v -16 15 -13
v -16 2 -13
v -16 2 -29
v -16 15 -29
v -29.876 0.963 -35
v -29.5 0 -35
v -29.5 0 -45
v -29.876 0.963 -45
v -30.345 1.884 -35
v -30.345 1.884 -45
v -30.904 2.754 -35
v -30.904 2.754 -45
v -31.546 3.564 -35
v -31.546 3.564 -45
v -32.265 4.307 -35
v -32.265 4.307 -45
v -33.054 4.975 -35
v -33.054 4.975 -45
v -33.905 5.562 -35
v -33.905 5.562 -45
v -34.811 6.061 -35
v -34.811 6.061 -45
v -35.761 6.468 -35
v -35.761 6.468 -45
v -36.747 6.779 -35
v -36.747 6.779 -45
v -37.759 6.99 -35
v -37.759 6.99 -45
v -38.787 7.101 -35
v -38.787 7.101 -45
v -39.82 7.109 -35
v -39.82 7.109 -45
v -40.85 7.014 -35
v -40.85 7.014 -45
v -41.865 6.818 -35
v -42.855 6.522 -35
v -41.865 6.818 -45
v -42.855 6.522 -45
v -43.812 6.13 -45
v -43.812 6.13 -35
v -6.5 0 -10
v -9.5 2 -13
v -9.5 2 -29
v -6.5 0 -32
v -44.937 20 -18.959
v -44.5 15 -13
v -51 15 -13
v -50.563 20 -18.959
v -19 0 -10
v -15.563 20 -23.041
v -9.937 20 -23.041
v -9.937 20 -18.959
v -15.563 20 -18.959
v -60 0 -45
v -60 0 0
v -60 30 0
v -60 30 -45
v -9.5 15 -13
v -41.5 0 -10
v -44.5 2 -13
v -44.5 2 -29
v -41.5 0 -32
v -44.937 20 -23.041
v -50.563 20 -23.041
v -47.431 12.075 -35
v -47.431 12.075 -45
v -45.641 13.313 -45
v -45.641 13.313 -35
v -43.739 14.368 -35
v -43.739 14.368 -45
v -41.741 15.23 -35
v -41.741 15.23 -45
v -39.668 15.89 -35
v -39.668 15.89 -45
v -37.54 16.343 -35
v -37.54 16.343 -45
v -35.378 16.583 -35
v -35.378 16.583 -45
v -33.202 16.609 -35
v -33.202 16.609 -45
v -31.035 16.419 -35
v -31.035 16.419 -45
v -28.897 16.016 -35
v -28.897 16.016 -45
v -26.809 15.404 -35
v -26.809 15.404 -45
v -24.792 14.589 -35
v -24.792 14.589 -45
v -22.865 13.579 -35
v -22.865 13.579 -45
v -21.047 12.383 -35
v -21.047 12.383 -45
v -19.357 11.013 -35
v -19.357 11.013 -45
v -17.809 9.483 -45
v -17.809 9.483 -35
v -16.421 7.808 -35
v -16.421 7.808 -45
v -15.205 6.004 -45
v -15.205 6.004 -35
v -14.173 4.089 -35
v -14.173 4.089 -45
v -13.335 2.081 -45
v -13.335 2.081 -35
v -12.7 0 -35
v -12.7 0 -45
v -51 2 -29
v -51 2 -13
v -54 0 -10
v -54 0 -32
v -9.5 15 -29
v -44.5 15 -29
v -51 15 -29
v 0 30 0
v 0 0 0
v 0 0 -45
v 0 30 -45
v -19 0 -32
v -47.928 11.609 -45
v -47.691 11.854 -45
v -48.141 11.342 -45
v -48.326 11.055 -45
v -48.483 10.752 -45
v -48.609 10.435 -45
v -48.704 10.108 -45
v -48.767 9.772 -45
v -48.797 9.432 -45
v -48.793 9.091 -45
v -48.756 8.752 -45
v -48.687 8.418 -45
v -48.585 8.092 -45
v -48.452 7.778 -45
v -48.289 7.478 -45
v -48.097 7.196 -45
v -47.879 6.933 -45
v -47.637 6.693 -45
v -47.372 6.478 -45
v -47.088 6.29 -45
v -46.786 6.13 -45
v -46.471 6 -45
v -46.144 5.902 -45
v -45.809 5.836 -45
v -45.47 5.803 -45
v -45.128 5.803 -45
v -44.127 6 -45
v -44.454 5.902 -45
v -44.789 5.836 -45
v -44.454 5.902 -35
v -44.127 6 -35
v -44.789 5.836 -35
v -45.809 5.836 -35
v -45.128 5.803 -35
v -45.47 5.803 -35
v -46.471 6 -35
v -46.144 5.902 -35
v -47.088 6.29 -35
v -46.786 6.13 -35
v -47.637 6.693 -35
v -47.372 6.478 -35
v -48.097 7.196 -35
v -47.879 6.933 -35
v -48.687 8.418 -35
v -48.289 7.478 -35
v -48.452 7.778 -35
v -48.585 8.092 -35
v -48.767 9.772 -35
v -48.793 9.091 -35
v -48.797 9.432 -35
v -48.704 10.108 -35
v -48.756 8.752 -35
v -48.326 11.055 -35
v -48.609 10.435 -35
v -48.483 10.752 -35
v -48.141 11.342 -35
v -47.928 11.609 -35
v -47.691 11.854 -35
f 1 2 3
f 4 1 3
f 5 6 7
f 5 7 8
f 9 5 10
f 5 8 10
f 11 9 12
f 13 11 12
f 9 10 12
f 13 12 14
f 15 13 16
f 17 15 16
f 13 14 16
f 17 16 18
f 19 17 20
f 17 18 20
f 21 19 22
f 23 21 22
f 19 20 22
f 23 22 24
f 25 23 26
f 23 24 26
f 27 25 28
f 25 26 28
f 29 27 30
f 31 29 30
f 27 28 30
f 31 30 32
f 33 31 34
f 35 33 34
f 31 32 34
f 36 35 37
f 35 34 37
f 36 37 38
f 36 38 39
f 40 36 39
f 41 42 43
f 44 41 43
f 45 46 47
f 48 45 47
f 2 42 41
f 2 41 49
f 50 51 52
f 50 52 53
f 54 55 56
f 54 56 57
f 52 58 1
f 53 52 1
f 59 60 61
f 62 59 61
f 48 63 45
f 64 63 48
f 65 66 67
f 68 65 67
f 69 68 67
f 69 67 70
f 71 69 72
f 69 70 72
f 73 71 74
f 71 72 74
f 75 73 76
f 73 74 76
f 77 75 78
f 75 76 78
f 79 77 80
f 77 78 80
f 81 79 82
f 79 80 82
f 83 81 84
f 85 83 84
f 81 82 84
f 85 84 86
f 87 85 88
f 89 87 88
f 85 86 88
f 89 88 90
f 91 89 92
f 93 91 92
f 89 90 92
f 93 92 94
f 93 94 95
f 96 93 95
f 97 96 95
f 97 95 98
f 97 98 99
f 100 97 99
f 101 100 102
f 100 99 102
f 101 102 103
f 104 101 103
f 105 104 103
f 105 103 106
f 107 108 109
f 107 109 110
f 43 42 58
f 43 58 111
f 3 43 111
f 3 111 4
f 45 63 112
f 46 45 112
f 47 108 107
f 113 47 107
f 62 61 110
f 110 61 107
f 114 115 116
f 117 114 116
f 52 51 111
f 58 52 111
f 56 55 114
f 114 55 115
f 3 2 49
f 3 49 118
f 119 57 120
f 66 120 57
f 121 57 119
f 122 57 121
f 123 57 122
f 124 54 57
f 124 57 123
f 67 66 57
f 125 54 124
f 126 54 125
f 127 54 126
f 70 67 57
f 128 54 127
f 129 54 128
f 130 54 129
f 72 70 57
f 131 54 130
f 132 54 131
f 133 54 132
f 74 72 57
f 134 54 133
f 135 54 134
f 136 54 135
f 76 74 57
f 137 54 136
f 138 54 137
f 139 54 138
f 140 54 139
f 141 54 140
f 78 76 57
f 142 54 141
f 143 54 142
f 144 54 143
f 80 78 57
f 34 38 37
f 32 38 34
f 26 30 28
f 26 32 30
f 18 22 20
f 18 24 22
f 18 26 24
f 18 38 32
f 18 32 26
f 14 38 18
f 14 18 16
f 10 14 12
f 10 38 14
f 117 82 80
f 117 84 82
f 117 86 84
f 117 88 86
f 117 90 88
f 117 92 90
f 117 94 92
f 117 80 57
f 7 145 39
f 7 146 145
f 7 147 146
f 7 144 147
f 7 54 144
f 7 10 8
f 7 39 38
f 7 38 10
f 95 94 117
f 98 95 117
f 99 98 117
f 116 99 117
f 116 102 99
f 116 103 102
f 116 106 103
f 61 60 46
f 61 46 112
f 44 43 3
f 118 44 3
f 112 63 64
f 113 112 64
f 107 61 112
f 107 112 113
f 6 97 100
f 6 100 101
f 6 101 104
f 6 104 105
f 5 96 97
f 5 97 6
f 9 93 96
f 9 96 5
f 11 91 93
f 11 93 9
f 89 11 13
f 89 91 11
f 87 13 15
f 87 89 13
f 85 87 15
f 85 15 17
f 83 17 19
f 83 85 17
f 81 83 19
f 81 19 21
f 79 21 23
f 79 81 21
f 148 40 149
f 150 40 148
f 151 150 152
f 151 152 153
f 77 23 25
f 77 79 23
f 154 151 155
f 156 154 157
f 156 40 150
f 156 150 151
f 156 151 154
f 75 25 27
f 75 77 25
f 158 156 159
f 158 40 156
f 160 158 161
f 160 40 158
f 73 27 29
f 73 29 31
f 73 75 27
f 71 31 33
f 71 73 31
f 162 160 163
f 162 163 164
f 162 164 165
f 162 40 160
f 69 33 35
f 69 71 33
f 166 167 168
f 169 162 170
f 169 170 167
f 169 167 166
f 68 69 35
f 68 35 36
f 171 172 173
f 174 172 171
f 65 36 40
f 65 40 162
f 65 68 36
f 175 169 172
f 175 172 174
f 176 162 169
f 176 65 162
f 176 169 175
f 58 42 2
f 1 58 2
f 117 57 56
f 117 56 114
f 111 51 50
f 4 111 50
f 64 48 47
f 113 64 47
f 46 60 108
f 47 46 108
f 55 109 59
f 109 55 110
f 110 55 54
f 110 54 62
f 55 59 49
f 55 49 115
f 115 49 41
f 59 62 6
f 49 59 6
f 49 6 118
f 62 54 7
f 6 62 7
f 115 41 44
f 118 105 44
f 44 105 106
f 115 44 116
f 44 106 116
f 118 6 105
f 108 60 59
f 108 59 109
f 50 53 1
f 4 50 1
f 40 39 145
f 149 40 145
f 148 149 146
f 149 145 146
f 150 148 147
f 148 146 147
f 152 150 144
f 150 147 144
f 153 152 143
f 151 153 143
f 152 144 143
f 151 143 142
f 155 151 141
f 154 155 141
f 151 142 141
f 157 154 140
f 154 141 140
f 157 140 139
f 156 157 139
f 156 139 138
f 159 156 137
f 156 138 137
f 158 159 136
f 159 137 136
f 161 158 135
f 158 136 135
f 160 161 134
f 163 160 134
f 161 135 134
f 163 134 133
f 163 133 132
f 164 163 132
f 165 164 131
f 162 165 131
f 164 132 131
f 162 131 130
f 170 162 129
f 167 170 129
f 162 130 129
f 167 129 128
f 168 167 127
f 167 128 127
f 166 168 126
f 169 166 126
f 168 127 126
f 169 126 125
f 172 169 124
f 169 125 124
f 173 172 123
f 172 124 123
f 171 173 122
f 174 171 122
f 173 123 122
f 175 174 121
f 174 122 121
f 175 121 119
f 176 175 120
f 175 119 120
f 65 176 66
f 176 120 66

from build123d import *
from OCP.BRepFilletAPI import BRepFilletAPI_MakeChamfer

# Parameters (mm, degrees)
SKETCH1_W           = 60
SKETCH1_H           = 45
BOSS_EXTRUDE1_DEPTH = 30
SKETCH2_W           = 6.5
SKETCH2_H           = 16
CUT_EXTRUDE1_DEPTH  = 20
CHAMFER1_SIZE       = 5
CHAMFER1_SIZE2      = 0.437443318
CHAMFER2_SIZE       = 5
CHAMFER2_SIZE2      = 5.958767963
CUT_EXTRUDE2_DEPTH  = 10
CHAMFER3_SIZE       = 3
CHAMFER3_SIZE2      = 2


with BuildPart() as part:
    # Sketch1 → Boss-Extrude1 (new body)
    with BuildSketch(Plane(origin=(0, 0, 0), x_dir=(1, 0, 0), z_dir=(0, 1, 0))):
        with Locations((-30, 22.5)):
            Rectangle(SKETCH1_W, SKETCH1_H)
    extrude(amount=BOSS_EXTRUDE1_DEPTH)

    # Sketch2 → Cut-Extrude1 (cut)
    with BuildSketch(Plane(origin=(0, 0, 0), x_dir=(-1, 0, 0), z_dir=(0, -1, 0))):
        with Locations((47.75, 21)):
            Rectangle(SKETCH2_W, SKETCH2_H)
        with Locations((12.75, 21)):
            Rectangle(SKETCH2_W, SKETCH2_H)
    extrude(amount=-CUT_EXTRUDE1_DEPTH, mode=Mode.SUBTRACT)

    # Chamfer1: one chamfer whose edges measure the first distance from different faces: ONE call of the kernel's chamfer builder (chamfer() names one face for all edges)
    chamfer1_edges_1 = [part.edges().sort_by_distance(p)[0] for p in [
        (-51, 20, -21),
    ]]
    chamfer1_side_1 = [part.faces().sort_by_distance(p)[0] for p in [
        (-51, 10, -21),
    ]]
    chamfer1_edges_2 = [part.edges().sort_by_distance(p)[0] for p in [
        (-44.5, 20, -21),
    ]]
    chamfer1_side_2 = [part.faces().sort_by_distance(p)[0] for p in [
        (-44.5, 10, -21),
    ]]
    chamfer1_edges_3 = [part.edges().sort_by_distance(p)[0] for p in [
        (-16, 20, -21),
    ]]
    chamfer1_side_3 = [part.faces().sort_by_distance(p)[0] for p in [
        (-16, 10, -21),
    ]]
    chamfer1_edges_4 = [part.edges().sort_by_distance(p)[0] for p in [
        (-9.5, 20, -21),
    ]]
    chamfer1_side_4 = [part.faces().sort_by_distance(p)[0] for p in [
        (-9.5, 10, -21),
    ]]
    chamfer1 = BRepFilletAPI_MakeChamfer(part.part.solid().wrapped)
    for e in chamfer1_edges_1:
        chamfer1.Add(CHAMFER1_SIZE, CHAMFER1_SIZE2, e.wrapped, chamfer1_side_1[0].wrapped)  # the first distance lies on this face
    for e in chamfer1_edges_2:
        chamfer1.Add(CHAMFER1_SIZE, CHAMFER1_SIZE2, e.wrapped, chamfer1_side_2[0].wrapped)  # the first distance lies on this face
    for e in chamfer1_edges_3:
        chamfer1.Add(CHAMFER1_SIZE, CHAMFER1_SIZE2, e.wrapped, chamfer1_side_3[0].wrapped)  # the first distance lies on this face
    for e in chamfer1_edges_4:
        chamfer1.Add(CHAMFER1_SIZE, CHAMFER1_SIZE2, e.wrapped, chamfer1_side_4[0].wrapped)  # the first distance lies on this face
    add(Compound.cast(chamfer1.Shape()), mode=Mode.REPLACE)

    # Chamfer2: one chamfer whose edges measure the first distance from different faces: ONE call of the kernel's chamfer builder (chamfer() names one face for all edges)
    chamfer2_edges_1 = [part.edges().sort_by_distance(p)[0] for p in [
        (-47.75, 20, -29),
    ]]
    chamfer2_side_1 = [part.faces().sort_by_distance(p)[0] for p in [
        (-47.75, 9.857394508, -29),
    ]]
    chamfer2_edges_2 = [part.edges().sort_by_distance(p)[0] for p in [
        (-12.75, 20, -29),
    ]]
    chamfer2_side_2 = [part.faces().sort_by_distance(p)[0] for p in [
        (-12.75, 9.857394508, -29),
    ]]
    chamfer2_edges_3 = [part.edges().sort_by_distance(p)[0] for p in [
        (-12.75, 20, -13),
    ]]
    chamfer2_side_3 = [part.faces().sort_by_distance(p)[0] for p in [
        (-12.75, 9.857394508, -13),
    ]]
    chamfer2_edges_4 = [part.edges().sort_by_distance(p)[0] for p in [
        (-47.75, 20, -13),
    ]]
    chamfer2_side_4 = [part.faces().sort_by_distance(p)[0] for p in [
        (-47.75, 9.857394508, -13),
    ]]
    chamfer2 = BRepFilletAPI_MakeChamfer(part.part.solid().wrapped)
    for e in chamfer2_edges_1:
        chamfer2.Add(CHAMFER2_SIZE, CHAMFER2_SIZE2, e.wrapped, chamfer2_side_1[0].wrapped)  # the first distance lies on this face
    for e in chamfer2_edges_2:
        chamfer2.Add(CHAMFER2_SIZE, CHAMFER2_SIZE2, e.wrapped, chamfer2_side_2[0].wrapped)  # the first distance lies on this face
    for e in chamfer2_edges_3:
        chamfer2.Add(CHAMFER2_SIZE, CHAMFER2_SIZE2, e.wrapped, chamfer2_side_3[0].wrapped)  # the first distance lies on this face
    for e in chamfer2_edges_4:
        chamfer2.Add(CHAMFER2_SIZE, CHAMFER2_SIZE2, e.wrapped, chamfer2_side_4[0].wrapped)  # the first distance lies on this face
    add(Compound.cast(chamfer2.Shape()), mode=Mode.REPLACE)

    # Sketch4 → Cut-Extrude2 (cut)
    with BuildSketch(Plane(origin=(0, 0, -45), x_dir=(-1, 0, 0), z_dir=(0, 0, -1))):
        with BuildLine():
            Line((12.7, 0), (29.5, 0))
            ThreePointArc((29.5, 0), (35.280602383, 6.276082414), (43.81191296, 6.13008847))
            ThreePointArc((43.81191296, 6.13008847), (48.288831578, 7.478397416), (47.430644896, 12.074510224))
            ThreePointArc((47.430644896, 12.074510224), (26.808734298, 15.404376803), (12.7, 0))
        make_face()
    extrude(amount=-CUT_EXTRUDE2_DEPTH, mode=Mode.SUBTRACT)

    # Chamfer3
    chamfer3_edges = [part.edges().sort_by_distance(p)[0] for p in [
        (-51, 0, -21),
        (-47.75, 0, -29),
        (-44.5, 0, -21),
        (-47.75, 0, -13),
        (-16, 0, -21),
        (-12.75, 0, -29),
        (-9.5, 0, -21),
        (-12.75, 0, -13),
    ]]
    chamfer3_side = [part.faces().sort_by_distance(p)[0] for p in [
        (-30.620998279, 0, -21.36919105),
    ]]
    chamfer(chamfer3_edges, length=CHAMFER3_SIZE, length2=CHAMFER3_SIZE2, reference=chamfer3_side[0])


solid = part.part
